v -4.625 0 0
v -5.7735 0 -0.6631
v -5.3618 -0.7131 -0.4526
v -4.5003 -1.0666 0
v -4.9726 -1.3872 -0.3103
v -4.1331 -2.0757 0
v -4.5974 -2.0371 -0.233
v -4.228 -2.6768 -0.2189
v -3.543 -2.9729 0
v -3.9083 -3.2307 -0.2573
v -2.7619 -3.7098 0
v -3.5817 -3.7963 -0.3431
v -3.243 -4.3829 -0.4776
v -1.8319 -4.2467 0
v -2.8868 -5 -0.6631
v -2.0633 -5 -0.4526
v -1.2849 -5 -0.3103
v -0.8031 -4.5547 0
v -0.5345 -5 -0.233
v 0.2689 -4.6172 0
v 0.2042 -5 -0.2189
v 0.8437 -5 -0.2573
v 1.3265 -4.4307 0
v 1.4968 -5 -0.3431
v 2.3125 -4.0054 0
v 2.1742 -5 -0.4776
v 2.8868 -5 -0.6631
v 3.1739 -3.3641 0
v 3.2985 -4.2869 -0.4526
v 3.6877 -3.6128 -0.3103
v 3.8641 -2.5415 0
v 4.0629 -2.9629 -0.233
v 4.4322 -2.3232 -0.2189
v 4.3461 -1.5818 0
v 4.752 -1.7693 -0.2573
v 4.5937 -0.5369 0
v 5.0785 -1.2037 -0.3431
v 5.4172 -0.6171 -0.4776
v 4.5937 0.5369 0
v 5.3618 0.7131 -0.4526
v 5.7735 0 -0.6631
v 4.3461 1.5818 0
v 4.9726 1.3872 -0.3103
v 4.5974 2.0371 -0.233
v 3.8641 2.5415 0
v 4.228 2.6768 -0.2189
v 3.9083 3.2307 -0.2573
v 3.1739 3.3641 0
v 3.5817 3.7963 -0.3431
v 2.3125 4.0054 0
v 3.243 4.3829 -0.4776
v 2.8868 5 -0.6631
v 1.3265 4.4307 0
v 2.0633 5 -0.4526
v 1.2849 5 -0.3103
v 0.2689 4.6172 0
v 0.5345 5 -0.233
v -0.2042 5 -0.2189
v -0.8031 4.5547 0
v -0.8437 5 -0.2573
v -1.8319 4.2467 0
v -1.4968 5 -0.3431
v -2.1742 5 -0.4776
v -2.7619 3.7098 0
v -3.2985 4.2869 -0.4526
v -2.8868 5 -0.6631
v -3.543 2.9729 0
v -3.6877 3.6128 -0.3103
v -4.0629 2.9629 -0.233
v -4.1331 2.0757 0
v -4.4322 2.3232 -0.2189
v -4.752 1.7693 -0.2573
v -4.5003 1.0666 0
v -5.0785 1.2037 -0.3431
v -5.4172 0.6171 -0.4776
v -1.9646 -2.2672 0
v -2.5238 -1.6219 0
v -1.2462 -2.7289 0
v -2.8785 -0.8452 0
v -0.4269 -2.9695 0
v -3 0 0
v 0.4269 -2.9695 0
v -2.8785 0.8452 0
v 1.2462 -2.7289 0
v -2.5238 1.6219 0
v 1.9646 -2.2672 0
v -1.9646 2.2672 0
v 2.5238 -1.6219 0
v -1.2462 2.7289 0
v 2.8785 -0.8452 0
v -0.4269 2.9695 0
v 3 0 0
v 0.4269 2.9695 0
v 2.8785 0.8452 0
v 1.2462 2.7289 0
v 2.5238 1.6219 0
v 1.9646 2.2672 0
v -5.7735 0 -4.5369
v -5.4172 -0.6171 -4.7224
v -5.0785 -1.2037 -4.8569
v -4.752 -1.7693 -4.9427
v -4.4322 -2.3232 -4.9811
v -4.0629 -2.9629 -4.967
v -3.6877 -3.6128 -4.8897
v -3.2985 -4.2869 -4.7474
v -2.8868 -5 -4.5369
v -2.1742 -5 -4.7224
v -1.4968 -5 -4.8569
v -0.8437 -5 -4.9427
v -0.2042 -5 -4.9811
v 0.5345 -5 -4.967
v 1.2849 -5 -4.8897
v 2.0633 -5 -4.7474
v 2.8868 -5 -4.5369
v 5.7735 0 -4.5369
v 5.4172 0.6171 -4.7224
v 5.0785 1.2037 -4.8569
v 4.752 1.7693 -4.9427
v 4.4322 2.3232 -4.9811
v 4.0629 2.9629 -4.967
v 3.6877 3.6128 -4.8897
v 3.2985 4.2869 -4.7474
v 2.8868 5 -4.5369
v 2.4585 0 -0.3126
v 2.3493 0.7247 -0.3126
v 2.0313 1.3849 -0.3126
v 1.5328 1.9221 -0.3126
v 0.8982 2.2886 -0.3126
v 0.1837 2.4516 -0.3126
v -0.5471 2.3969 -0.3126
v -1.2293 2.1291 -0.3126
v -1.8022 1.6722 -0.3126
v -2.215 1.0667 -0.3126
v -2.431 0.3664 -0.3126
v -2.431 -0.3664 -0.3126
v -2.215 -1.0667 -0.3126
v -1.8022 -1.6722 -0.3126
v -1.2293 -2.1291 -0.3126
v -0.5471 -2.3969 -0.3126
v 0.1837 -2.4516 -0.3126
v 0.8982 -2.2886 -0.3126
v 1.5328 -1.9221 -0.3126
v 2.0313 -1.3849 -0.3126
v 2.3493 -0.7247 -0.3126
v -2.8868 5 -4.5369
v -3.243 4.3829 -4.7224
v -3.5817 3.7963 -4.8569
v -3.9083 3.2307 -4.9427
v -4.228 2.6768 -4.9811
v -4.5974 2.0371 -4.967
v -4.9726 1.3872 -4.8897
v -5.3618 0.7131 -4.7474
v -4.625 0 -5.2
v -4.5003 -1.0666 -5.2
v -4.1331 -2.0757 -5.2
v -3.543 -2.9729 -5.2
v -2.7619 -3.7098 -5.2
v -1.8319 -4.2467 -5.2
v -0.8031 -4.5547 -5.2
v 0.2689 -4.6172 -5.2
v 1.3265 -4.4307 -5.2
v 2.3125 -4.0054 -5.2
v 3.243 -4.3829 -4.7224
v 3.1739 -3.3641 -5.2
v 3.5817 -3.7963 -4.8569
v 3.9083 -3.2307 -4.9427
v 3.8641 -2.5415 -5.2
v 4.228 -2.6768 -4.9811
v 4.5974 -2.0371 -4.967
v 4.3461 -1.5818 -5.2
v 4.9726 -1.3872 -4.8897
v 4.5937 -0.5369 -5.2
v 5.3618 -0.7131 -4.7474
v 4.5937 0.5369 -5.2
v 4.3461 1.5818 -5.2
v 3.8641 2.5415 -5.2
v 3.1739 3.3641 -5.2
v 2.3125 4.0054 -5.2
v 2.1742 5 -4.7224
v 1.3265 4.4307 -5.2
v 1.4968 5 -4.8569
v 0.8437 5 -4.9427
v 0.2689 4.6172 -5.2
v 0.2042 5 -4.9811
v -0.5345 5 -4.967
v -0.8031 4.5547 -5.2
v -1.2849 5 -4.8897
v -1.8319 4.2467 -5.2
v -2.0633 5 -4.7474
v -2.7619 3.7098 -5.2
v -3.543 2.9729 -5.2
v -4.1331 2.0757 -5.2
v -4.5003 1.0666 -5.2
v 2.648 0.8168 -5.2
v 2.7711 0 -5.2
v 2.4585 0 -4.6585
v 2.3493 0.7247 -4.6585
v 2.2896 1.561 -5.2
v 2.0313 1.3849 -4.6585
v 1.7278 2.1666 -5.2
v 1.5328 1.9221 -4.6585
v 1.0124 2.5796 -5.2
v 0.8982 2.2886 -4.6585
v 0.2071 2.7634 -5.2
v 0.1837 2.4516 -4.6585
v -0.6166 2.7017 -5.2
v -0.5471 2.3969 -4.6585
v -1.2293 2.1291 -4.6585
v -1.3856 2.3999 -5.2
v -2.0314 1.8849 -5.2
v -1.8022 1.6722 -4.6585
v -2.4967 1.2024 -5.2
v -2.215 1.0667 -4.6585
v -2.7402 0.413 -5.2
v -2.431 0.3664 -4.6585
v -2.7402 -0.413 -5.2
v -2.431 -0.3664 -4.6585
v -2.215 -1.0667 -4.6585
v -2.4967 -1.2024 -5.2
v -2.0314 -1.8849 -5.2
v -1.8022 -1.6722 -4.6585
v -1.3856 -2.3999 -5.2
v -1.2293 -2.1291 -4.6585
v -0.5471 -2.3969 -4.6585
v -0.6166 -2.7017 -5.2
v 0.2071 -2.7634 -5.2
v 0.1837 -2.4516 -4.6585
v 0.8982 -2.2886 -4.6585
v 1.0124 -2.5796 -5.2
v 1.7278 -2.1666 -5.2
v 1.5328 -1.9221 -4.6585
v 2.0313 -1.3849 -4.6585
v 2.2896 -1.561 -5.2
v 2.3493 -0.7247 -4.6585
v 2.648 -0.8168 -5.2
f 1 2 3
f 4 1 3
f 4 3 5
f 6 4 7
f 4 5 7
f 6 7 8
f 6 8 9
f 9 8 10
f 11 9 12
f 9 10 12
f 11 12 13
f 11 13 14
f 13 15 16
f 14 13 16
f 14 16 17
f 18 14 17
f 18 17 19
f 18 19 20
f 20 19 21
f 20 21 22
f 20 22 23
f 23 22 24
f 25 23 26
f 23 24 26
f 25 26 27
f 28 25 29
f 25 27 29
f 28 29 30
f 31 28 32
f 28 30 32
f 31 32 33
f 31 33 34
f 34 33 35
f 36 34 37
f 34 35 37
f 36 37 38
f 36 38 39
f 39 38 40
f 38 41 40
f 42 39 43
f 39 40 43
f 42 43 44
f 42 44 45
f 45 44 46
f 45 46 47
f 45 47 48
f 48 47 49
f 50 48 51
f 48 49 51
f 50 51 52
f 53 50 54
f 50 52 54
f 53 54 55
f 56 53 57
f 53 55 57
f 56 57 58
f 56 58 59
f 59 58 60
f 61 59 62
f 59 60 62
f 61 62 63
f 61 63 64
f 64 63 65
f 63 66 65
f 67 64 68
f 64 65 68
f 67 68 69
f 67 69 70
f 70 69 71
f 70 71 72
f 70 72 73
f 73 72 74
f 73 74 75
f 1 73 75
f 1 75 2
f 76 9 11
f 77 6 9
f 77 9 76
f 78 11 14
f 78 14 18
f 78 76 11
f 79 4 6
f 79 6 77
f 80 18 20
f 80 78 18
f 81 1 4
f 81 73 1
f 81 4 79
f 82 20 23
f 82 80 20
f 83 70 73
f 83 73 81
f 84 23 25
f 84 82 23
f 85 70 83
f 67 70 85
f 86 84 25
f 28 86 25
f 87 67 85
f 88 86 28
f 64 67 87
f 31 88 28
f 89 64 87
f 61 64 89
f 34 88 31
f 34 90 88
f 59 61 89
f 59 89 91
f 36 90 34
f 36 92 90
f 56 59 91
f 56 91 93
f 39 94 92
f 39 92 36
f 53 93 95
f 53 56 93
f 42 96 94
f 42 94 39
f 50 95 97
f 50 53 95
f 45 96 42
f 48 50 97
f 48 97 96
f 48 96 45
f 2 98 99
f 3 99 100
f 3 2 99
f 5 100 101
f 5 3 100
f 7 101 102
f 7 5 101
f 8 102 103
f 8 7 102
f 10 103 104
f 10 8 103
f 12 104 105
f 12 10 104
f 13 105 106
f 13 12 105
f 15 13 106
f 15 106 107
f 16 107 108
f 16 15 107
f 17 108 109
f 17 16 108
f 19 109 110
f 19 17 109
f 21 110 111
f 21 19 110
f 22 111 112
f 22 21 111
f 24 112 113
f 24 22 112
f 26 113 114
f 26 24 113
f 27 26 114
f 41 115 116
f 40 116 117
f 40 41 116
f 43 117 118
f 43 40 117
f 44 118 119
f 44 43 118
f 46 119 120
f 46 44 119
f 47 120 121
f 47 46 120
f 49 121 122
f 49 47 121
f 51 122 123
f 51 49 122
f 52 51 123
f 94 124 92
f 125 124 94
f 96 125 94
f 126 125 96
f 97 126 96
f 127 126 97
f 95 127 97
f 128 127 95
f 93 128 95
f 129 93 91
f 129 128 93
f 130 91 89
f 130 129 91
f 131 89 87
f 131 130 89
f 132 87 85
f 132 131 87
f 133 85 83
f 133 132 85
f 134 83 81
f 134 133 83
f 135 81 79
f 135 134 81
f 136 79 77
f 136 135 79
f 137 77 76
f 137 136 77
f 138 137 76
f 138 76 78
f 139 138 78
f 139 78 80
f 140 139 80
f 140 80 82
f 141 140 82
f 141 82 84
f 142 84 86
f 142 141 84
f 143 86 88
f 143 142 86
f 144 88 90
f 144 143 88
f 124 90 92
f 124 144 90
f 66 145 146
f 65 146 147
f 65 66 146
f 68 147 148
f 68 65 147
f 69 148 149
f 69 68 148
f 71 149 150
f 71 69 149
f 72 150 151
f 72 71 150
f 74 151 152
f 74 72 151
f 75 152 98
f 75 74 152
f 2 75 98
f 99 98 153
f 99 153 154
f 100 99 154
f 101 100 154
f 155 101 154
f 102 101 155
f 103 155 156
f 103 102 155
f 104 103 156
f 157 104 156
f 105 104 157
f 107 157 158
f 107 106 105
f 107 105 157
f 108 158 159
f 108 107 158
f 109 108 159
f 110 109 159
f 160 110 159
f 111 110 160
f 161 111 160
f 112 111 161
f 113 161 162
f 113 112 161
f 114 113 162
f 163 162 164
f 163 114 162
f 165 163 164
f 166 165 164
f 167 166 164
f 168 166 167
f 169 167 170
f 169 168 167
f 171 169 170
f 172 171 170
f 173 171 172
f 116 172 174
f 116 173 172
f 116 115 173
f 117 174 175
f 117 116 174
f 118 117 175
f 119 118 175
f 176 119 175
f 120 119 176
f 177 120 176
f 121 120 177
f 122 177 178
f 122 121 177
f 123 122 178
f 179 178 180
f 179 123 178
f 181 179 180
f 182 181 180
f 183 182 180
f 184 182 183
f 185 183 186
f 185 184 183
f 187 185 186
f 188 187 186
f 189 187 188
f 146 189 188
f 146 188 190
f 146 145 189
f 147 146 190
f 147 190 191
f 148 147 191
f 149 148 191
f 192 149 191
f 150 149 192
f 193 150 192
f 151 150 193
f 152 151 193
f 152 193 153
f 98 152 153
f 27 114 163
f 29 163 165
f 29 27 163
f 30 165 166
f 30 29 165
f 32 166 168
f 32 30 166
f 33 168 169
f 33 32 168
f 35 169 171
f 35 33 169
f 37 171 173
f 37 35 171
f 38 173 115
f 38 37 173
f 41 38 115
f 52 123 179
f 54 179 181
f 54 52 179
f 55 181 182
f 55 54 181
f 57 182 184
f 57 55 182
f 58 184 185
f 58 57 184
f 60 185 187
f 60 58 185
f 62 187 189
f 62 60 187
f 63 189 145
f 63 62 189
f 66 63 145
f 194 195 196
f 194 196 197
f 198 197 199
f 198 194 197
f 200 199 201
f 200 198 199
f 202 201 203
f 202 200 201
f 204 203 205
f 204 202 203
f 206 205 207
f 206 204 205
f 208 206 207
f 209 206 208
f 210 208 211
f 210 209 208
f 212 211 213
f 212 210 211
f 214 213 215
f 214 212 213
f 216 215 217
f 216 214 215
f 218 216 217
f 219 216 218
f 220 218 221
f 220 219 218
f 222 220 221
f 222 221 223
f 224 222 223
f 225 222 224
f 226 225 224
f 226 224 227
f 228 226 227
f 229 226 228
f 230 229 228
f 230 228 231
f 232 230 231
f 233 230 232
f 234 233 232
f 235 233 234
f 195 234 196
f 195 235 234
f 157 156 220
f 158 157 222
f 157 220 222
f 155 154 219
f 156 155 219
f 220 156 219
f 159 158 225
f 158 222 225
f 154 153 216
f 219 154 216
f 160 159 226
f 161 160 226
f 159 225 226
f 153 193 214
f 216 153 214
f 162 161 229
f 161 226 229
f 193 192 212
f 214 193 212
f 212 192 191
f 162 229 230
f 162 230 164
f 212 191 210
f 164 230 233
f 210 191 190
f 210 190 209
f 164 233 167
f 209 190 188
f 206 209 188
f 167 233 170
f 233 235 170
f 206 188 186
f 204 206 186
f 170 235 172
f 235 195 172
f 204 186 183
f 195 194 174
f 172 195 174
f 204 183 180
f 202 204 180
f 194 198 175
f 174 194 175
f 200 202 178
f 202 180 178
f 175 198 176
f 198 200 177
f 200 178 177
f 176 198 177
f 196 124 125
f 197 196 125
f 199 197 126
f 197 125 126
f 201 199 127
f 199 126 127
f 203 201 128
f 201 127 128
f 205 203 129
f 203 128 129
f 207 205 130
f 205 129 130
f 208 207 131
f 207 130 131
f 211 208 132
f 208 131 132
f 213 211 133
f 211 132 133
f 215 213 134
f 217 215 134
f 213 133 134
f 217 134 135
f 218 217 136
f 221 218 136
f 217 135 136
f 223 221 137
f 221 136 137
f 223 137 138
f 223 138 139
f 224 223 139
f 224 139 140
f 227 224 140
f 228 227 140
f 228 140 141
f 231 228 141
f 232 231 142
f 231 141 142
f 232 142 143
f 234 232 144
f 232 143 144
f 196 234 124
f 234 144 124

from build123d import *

# Parameters (mm, degrees)
SKETCH1_R               = 2.4585
BASENUT_DEPTH           = 5.2
ENDCHAMFER_SIZE         = 0.5415
ENDCHAMFER_SIZE2        = 0.312635171
ENDCHAMFER_PART_2_SIZE  = 0.5415
ENDCHAMFER_PART_2_SIZE2 = 0.312635171


with BuildPart() as part:
    # Sketch1 → BaseNut (new body)
    with BuildSketch(Plane.XY):
        Polygon((5.773502692, 0), (2.886751346, 5), (-2.886751346, 5), (-5.773502692, 0), (-2.886751346, -5), (2.886751346, -5), align=None)
        Circle(SKETCH1_R, mode=Mode.SUBTRACT)
    extrude(amount=-BASENUT_DEPTH)

    # Sketch2 → Double-Chamfer (revolve, cut)
    with BuildSketch(Plane(origin=(0, 0, 0), x_dir=(1, 0, 0), z_dir=(0, 1, 0))):
        Polygon((-5.773502692, 5.2), (-4.625, 5.2), (-5.773502692, 4.536911662), align=None)
        Polygon((-5.773502692, 0.663088338), (-5.773502692, 0), (-4.625, 0), align=None)
    revolve(axis=Axis((0, 0, -3.375940562), (0, 0, 1)), mode=Mode.SUBTRACT)

    # EndChamfer
    endchamfer_edges = [part.edges().sort_by_distance(p)[0] for p in [
        (-2.4585, 0, -5.2),
    ]]
    endchamfer_side = [part.faces().sort_by_distance(p)[0] for p in [
        (-2.4585, 0, -2.6),
    ]]
    chamfer(endchamfer_edges, length=ENDCHAMFER_SIZE, length2=ENDCHAMFER_SIZE2, reference=endchamfer_side[0])

    # EndChamfer part 2
    endchamfer_part_2_edges = [part.edges().sort_by_distance(p)[0] for p in [
        (-2.4585, 0, 0),
    ]]
    endchamfer_part_2_side = [part.faces().sort_by_distance(p)[0] for p in [
        (4.494185245, 0, 0),
    ]]
    chamfer(endchamfer_part_2_edges, length=ENDCHAMFER_PART_2_SIZE, length2=ENDCHAMFER_PART_2_SIZE2, reference=endchamfer_part_2_side[0])


solid = part.part
